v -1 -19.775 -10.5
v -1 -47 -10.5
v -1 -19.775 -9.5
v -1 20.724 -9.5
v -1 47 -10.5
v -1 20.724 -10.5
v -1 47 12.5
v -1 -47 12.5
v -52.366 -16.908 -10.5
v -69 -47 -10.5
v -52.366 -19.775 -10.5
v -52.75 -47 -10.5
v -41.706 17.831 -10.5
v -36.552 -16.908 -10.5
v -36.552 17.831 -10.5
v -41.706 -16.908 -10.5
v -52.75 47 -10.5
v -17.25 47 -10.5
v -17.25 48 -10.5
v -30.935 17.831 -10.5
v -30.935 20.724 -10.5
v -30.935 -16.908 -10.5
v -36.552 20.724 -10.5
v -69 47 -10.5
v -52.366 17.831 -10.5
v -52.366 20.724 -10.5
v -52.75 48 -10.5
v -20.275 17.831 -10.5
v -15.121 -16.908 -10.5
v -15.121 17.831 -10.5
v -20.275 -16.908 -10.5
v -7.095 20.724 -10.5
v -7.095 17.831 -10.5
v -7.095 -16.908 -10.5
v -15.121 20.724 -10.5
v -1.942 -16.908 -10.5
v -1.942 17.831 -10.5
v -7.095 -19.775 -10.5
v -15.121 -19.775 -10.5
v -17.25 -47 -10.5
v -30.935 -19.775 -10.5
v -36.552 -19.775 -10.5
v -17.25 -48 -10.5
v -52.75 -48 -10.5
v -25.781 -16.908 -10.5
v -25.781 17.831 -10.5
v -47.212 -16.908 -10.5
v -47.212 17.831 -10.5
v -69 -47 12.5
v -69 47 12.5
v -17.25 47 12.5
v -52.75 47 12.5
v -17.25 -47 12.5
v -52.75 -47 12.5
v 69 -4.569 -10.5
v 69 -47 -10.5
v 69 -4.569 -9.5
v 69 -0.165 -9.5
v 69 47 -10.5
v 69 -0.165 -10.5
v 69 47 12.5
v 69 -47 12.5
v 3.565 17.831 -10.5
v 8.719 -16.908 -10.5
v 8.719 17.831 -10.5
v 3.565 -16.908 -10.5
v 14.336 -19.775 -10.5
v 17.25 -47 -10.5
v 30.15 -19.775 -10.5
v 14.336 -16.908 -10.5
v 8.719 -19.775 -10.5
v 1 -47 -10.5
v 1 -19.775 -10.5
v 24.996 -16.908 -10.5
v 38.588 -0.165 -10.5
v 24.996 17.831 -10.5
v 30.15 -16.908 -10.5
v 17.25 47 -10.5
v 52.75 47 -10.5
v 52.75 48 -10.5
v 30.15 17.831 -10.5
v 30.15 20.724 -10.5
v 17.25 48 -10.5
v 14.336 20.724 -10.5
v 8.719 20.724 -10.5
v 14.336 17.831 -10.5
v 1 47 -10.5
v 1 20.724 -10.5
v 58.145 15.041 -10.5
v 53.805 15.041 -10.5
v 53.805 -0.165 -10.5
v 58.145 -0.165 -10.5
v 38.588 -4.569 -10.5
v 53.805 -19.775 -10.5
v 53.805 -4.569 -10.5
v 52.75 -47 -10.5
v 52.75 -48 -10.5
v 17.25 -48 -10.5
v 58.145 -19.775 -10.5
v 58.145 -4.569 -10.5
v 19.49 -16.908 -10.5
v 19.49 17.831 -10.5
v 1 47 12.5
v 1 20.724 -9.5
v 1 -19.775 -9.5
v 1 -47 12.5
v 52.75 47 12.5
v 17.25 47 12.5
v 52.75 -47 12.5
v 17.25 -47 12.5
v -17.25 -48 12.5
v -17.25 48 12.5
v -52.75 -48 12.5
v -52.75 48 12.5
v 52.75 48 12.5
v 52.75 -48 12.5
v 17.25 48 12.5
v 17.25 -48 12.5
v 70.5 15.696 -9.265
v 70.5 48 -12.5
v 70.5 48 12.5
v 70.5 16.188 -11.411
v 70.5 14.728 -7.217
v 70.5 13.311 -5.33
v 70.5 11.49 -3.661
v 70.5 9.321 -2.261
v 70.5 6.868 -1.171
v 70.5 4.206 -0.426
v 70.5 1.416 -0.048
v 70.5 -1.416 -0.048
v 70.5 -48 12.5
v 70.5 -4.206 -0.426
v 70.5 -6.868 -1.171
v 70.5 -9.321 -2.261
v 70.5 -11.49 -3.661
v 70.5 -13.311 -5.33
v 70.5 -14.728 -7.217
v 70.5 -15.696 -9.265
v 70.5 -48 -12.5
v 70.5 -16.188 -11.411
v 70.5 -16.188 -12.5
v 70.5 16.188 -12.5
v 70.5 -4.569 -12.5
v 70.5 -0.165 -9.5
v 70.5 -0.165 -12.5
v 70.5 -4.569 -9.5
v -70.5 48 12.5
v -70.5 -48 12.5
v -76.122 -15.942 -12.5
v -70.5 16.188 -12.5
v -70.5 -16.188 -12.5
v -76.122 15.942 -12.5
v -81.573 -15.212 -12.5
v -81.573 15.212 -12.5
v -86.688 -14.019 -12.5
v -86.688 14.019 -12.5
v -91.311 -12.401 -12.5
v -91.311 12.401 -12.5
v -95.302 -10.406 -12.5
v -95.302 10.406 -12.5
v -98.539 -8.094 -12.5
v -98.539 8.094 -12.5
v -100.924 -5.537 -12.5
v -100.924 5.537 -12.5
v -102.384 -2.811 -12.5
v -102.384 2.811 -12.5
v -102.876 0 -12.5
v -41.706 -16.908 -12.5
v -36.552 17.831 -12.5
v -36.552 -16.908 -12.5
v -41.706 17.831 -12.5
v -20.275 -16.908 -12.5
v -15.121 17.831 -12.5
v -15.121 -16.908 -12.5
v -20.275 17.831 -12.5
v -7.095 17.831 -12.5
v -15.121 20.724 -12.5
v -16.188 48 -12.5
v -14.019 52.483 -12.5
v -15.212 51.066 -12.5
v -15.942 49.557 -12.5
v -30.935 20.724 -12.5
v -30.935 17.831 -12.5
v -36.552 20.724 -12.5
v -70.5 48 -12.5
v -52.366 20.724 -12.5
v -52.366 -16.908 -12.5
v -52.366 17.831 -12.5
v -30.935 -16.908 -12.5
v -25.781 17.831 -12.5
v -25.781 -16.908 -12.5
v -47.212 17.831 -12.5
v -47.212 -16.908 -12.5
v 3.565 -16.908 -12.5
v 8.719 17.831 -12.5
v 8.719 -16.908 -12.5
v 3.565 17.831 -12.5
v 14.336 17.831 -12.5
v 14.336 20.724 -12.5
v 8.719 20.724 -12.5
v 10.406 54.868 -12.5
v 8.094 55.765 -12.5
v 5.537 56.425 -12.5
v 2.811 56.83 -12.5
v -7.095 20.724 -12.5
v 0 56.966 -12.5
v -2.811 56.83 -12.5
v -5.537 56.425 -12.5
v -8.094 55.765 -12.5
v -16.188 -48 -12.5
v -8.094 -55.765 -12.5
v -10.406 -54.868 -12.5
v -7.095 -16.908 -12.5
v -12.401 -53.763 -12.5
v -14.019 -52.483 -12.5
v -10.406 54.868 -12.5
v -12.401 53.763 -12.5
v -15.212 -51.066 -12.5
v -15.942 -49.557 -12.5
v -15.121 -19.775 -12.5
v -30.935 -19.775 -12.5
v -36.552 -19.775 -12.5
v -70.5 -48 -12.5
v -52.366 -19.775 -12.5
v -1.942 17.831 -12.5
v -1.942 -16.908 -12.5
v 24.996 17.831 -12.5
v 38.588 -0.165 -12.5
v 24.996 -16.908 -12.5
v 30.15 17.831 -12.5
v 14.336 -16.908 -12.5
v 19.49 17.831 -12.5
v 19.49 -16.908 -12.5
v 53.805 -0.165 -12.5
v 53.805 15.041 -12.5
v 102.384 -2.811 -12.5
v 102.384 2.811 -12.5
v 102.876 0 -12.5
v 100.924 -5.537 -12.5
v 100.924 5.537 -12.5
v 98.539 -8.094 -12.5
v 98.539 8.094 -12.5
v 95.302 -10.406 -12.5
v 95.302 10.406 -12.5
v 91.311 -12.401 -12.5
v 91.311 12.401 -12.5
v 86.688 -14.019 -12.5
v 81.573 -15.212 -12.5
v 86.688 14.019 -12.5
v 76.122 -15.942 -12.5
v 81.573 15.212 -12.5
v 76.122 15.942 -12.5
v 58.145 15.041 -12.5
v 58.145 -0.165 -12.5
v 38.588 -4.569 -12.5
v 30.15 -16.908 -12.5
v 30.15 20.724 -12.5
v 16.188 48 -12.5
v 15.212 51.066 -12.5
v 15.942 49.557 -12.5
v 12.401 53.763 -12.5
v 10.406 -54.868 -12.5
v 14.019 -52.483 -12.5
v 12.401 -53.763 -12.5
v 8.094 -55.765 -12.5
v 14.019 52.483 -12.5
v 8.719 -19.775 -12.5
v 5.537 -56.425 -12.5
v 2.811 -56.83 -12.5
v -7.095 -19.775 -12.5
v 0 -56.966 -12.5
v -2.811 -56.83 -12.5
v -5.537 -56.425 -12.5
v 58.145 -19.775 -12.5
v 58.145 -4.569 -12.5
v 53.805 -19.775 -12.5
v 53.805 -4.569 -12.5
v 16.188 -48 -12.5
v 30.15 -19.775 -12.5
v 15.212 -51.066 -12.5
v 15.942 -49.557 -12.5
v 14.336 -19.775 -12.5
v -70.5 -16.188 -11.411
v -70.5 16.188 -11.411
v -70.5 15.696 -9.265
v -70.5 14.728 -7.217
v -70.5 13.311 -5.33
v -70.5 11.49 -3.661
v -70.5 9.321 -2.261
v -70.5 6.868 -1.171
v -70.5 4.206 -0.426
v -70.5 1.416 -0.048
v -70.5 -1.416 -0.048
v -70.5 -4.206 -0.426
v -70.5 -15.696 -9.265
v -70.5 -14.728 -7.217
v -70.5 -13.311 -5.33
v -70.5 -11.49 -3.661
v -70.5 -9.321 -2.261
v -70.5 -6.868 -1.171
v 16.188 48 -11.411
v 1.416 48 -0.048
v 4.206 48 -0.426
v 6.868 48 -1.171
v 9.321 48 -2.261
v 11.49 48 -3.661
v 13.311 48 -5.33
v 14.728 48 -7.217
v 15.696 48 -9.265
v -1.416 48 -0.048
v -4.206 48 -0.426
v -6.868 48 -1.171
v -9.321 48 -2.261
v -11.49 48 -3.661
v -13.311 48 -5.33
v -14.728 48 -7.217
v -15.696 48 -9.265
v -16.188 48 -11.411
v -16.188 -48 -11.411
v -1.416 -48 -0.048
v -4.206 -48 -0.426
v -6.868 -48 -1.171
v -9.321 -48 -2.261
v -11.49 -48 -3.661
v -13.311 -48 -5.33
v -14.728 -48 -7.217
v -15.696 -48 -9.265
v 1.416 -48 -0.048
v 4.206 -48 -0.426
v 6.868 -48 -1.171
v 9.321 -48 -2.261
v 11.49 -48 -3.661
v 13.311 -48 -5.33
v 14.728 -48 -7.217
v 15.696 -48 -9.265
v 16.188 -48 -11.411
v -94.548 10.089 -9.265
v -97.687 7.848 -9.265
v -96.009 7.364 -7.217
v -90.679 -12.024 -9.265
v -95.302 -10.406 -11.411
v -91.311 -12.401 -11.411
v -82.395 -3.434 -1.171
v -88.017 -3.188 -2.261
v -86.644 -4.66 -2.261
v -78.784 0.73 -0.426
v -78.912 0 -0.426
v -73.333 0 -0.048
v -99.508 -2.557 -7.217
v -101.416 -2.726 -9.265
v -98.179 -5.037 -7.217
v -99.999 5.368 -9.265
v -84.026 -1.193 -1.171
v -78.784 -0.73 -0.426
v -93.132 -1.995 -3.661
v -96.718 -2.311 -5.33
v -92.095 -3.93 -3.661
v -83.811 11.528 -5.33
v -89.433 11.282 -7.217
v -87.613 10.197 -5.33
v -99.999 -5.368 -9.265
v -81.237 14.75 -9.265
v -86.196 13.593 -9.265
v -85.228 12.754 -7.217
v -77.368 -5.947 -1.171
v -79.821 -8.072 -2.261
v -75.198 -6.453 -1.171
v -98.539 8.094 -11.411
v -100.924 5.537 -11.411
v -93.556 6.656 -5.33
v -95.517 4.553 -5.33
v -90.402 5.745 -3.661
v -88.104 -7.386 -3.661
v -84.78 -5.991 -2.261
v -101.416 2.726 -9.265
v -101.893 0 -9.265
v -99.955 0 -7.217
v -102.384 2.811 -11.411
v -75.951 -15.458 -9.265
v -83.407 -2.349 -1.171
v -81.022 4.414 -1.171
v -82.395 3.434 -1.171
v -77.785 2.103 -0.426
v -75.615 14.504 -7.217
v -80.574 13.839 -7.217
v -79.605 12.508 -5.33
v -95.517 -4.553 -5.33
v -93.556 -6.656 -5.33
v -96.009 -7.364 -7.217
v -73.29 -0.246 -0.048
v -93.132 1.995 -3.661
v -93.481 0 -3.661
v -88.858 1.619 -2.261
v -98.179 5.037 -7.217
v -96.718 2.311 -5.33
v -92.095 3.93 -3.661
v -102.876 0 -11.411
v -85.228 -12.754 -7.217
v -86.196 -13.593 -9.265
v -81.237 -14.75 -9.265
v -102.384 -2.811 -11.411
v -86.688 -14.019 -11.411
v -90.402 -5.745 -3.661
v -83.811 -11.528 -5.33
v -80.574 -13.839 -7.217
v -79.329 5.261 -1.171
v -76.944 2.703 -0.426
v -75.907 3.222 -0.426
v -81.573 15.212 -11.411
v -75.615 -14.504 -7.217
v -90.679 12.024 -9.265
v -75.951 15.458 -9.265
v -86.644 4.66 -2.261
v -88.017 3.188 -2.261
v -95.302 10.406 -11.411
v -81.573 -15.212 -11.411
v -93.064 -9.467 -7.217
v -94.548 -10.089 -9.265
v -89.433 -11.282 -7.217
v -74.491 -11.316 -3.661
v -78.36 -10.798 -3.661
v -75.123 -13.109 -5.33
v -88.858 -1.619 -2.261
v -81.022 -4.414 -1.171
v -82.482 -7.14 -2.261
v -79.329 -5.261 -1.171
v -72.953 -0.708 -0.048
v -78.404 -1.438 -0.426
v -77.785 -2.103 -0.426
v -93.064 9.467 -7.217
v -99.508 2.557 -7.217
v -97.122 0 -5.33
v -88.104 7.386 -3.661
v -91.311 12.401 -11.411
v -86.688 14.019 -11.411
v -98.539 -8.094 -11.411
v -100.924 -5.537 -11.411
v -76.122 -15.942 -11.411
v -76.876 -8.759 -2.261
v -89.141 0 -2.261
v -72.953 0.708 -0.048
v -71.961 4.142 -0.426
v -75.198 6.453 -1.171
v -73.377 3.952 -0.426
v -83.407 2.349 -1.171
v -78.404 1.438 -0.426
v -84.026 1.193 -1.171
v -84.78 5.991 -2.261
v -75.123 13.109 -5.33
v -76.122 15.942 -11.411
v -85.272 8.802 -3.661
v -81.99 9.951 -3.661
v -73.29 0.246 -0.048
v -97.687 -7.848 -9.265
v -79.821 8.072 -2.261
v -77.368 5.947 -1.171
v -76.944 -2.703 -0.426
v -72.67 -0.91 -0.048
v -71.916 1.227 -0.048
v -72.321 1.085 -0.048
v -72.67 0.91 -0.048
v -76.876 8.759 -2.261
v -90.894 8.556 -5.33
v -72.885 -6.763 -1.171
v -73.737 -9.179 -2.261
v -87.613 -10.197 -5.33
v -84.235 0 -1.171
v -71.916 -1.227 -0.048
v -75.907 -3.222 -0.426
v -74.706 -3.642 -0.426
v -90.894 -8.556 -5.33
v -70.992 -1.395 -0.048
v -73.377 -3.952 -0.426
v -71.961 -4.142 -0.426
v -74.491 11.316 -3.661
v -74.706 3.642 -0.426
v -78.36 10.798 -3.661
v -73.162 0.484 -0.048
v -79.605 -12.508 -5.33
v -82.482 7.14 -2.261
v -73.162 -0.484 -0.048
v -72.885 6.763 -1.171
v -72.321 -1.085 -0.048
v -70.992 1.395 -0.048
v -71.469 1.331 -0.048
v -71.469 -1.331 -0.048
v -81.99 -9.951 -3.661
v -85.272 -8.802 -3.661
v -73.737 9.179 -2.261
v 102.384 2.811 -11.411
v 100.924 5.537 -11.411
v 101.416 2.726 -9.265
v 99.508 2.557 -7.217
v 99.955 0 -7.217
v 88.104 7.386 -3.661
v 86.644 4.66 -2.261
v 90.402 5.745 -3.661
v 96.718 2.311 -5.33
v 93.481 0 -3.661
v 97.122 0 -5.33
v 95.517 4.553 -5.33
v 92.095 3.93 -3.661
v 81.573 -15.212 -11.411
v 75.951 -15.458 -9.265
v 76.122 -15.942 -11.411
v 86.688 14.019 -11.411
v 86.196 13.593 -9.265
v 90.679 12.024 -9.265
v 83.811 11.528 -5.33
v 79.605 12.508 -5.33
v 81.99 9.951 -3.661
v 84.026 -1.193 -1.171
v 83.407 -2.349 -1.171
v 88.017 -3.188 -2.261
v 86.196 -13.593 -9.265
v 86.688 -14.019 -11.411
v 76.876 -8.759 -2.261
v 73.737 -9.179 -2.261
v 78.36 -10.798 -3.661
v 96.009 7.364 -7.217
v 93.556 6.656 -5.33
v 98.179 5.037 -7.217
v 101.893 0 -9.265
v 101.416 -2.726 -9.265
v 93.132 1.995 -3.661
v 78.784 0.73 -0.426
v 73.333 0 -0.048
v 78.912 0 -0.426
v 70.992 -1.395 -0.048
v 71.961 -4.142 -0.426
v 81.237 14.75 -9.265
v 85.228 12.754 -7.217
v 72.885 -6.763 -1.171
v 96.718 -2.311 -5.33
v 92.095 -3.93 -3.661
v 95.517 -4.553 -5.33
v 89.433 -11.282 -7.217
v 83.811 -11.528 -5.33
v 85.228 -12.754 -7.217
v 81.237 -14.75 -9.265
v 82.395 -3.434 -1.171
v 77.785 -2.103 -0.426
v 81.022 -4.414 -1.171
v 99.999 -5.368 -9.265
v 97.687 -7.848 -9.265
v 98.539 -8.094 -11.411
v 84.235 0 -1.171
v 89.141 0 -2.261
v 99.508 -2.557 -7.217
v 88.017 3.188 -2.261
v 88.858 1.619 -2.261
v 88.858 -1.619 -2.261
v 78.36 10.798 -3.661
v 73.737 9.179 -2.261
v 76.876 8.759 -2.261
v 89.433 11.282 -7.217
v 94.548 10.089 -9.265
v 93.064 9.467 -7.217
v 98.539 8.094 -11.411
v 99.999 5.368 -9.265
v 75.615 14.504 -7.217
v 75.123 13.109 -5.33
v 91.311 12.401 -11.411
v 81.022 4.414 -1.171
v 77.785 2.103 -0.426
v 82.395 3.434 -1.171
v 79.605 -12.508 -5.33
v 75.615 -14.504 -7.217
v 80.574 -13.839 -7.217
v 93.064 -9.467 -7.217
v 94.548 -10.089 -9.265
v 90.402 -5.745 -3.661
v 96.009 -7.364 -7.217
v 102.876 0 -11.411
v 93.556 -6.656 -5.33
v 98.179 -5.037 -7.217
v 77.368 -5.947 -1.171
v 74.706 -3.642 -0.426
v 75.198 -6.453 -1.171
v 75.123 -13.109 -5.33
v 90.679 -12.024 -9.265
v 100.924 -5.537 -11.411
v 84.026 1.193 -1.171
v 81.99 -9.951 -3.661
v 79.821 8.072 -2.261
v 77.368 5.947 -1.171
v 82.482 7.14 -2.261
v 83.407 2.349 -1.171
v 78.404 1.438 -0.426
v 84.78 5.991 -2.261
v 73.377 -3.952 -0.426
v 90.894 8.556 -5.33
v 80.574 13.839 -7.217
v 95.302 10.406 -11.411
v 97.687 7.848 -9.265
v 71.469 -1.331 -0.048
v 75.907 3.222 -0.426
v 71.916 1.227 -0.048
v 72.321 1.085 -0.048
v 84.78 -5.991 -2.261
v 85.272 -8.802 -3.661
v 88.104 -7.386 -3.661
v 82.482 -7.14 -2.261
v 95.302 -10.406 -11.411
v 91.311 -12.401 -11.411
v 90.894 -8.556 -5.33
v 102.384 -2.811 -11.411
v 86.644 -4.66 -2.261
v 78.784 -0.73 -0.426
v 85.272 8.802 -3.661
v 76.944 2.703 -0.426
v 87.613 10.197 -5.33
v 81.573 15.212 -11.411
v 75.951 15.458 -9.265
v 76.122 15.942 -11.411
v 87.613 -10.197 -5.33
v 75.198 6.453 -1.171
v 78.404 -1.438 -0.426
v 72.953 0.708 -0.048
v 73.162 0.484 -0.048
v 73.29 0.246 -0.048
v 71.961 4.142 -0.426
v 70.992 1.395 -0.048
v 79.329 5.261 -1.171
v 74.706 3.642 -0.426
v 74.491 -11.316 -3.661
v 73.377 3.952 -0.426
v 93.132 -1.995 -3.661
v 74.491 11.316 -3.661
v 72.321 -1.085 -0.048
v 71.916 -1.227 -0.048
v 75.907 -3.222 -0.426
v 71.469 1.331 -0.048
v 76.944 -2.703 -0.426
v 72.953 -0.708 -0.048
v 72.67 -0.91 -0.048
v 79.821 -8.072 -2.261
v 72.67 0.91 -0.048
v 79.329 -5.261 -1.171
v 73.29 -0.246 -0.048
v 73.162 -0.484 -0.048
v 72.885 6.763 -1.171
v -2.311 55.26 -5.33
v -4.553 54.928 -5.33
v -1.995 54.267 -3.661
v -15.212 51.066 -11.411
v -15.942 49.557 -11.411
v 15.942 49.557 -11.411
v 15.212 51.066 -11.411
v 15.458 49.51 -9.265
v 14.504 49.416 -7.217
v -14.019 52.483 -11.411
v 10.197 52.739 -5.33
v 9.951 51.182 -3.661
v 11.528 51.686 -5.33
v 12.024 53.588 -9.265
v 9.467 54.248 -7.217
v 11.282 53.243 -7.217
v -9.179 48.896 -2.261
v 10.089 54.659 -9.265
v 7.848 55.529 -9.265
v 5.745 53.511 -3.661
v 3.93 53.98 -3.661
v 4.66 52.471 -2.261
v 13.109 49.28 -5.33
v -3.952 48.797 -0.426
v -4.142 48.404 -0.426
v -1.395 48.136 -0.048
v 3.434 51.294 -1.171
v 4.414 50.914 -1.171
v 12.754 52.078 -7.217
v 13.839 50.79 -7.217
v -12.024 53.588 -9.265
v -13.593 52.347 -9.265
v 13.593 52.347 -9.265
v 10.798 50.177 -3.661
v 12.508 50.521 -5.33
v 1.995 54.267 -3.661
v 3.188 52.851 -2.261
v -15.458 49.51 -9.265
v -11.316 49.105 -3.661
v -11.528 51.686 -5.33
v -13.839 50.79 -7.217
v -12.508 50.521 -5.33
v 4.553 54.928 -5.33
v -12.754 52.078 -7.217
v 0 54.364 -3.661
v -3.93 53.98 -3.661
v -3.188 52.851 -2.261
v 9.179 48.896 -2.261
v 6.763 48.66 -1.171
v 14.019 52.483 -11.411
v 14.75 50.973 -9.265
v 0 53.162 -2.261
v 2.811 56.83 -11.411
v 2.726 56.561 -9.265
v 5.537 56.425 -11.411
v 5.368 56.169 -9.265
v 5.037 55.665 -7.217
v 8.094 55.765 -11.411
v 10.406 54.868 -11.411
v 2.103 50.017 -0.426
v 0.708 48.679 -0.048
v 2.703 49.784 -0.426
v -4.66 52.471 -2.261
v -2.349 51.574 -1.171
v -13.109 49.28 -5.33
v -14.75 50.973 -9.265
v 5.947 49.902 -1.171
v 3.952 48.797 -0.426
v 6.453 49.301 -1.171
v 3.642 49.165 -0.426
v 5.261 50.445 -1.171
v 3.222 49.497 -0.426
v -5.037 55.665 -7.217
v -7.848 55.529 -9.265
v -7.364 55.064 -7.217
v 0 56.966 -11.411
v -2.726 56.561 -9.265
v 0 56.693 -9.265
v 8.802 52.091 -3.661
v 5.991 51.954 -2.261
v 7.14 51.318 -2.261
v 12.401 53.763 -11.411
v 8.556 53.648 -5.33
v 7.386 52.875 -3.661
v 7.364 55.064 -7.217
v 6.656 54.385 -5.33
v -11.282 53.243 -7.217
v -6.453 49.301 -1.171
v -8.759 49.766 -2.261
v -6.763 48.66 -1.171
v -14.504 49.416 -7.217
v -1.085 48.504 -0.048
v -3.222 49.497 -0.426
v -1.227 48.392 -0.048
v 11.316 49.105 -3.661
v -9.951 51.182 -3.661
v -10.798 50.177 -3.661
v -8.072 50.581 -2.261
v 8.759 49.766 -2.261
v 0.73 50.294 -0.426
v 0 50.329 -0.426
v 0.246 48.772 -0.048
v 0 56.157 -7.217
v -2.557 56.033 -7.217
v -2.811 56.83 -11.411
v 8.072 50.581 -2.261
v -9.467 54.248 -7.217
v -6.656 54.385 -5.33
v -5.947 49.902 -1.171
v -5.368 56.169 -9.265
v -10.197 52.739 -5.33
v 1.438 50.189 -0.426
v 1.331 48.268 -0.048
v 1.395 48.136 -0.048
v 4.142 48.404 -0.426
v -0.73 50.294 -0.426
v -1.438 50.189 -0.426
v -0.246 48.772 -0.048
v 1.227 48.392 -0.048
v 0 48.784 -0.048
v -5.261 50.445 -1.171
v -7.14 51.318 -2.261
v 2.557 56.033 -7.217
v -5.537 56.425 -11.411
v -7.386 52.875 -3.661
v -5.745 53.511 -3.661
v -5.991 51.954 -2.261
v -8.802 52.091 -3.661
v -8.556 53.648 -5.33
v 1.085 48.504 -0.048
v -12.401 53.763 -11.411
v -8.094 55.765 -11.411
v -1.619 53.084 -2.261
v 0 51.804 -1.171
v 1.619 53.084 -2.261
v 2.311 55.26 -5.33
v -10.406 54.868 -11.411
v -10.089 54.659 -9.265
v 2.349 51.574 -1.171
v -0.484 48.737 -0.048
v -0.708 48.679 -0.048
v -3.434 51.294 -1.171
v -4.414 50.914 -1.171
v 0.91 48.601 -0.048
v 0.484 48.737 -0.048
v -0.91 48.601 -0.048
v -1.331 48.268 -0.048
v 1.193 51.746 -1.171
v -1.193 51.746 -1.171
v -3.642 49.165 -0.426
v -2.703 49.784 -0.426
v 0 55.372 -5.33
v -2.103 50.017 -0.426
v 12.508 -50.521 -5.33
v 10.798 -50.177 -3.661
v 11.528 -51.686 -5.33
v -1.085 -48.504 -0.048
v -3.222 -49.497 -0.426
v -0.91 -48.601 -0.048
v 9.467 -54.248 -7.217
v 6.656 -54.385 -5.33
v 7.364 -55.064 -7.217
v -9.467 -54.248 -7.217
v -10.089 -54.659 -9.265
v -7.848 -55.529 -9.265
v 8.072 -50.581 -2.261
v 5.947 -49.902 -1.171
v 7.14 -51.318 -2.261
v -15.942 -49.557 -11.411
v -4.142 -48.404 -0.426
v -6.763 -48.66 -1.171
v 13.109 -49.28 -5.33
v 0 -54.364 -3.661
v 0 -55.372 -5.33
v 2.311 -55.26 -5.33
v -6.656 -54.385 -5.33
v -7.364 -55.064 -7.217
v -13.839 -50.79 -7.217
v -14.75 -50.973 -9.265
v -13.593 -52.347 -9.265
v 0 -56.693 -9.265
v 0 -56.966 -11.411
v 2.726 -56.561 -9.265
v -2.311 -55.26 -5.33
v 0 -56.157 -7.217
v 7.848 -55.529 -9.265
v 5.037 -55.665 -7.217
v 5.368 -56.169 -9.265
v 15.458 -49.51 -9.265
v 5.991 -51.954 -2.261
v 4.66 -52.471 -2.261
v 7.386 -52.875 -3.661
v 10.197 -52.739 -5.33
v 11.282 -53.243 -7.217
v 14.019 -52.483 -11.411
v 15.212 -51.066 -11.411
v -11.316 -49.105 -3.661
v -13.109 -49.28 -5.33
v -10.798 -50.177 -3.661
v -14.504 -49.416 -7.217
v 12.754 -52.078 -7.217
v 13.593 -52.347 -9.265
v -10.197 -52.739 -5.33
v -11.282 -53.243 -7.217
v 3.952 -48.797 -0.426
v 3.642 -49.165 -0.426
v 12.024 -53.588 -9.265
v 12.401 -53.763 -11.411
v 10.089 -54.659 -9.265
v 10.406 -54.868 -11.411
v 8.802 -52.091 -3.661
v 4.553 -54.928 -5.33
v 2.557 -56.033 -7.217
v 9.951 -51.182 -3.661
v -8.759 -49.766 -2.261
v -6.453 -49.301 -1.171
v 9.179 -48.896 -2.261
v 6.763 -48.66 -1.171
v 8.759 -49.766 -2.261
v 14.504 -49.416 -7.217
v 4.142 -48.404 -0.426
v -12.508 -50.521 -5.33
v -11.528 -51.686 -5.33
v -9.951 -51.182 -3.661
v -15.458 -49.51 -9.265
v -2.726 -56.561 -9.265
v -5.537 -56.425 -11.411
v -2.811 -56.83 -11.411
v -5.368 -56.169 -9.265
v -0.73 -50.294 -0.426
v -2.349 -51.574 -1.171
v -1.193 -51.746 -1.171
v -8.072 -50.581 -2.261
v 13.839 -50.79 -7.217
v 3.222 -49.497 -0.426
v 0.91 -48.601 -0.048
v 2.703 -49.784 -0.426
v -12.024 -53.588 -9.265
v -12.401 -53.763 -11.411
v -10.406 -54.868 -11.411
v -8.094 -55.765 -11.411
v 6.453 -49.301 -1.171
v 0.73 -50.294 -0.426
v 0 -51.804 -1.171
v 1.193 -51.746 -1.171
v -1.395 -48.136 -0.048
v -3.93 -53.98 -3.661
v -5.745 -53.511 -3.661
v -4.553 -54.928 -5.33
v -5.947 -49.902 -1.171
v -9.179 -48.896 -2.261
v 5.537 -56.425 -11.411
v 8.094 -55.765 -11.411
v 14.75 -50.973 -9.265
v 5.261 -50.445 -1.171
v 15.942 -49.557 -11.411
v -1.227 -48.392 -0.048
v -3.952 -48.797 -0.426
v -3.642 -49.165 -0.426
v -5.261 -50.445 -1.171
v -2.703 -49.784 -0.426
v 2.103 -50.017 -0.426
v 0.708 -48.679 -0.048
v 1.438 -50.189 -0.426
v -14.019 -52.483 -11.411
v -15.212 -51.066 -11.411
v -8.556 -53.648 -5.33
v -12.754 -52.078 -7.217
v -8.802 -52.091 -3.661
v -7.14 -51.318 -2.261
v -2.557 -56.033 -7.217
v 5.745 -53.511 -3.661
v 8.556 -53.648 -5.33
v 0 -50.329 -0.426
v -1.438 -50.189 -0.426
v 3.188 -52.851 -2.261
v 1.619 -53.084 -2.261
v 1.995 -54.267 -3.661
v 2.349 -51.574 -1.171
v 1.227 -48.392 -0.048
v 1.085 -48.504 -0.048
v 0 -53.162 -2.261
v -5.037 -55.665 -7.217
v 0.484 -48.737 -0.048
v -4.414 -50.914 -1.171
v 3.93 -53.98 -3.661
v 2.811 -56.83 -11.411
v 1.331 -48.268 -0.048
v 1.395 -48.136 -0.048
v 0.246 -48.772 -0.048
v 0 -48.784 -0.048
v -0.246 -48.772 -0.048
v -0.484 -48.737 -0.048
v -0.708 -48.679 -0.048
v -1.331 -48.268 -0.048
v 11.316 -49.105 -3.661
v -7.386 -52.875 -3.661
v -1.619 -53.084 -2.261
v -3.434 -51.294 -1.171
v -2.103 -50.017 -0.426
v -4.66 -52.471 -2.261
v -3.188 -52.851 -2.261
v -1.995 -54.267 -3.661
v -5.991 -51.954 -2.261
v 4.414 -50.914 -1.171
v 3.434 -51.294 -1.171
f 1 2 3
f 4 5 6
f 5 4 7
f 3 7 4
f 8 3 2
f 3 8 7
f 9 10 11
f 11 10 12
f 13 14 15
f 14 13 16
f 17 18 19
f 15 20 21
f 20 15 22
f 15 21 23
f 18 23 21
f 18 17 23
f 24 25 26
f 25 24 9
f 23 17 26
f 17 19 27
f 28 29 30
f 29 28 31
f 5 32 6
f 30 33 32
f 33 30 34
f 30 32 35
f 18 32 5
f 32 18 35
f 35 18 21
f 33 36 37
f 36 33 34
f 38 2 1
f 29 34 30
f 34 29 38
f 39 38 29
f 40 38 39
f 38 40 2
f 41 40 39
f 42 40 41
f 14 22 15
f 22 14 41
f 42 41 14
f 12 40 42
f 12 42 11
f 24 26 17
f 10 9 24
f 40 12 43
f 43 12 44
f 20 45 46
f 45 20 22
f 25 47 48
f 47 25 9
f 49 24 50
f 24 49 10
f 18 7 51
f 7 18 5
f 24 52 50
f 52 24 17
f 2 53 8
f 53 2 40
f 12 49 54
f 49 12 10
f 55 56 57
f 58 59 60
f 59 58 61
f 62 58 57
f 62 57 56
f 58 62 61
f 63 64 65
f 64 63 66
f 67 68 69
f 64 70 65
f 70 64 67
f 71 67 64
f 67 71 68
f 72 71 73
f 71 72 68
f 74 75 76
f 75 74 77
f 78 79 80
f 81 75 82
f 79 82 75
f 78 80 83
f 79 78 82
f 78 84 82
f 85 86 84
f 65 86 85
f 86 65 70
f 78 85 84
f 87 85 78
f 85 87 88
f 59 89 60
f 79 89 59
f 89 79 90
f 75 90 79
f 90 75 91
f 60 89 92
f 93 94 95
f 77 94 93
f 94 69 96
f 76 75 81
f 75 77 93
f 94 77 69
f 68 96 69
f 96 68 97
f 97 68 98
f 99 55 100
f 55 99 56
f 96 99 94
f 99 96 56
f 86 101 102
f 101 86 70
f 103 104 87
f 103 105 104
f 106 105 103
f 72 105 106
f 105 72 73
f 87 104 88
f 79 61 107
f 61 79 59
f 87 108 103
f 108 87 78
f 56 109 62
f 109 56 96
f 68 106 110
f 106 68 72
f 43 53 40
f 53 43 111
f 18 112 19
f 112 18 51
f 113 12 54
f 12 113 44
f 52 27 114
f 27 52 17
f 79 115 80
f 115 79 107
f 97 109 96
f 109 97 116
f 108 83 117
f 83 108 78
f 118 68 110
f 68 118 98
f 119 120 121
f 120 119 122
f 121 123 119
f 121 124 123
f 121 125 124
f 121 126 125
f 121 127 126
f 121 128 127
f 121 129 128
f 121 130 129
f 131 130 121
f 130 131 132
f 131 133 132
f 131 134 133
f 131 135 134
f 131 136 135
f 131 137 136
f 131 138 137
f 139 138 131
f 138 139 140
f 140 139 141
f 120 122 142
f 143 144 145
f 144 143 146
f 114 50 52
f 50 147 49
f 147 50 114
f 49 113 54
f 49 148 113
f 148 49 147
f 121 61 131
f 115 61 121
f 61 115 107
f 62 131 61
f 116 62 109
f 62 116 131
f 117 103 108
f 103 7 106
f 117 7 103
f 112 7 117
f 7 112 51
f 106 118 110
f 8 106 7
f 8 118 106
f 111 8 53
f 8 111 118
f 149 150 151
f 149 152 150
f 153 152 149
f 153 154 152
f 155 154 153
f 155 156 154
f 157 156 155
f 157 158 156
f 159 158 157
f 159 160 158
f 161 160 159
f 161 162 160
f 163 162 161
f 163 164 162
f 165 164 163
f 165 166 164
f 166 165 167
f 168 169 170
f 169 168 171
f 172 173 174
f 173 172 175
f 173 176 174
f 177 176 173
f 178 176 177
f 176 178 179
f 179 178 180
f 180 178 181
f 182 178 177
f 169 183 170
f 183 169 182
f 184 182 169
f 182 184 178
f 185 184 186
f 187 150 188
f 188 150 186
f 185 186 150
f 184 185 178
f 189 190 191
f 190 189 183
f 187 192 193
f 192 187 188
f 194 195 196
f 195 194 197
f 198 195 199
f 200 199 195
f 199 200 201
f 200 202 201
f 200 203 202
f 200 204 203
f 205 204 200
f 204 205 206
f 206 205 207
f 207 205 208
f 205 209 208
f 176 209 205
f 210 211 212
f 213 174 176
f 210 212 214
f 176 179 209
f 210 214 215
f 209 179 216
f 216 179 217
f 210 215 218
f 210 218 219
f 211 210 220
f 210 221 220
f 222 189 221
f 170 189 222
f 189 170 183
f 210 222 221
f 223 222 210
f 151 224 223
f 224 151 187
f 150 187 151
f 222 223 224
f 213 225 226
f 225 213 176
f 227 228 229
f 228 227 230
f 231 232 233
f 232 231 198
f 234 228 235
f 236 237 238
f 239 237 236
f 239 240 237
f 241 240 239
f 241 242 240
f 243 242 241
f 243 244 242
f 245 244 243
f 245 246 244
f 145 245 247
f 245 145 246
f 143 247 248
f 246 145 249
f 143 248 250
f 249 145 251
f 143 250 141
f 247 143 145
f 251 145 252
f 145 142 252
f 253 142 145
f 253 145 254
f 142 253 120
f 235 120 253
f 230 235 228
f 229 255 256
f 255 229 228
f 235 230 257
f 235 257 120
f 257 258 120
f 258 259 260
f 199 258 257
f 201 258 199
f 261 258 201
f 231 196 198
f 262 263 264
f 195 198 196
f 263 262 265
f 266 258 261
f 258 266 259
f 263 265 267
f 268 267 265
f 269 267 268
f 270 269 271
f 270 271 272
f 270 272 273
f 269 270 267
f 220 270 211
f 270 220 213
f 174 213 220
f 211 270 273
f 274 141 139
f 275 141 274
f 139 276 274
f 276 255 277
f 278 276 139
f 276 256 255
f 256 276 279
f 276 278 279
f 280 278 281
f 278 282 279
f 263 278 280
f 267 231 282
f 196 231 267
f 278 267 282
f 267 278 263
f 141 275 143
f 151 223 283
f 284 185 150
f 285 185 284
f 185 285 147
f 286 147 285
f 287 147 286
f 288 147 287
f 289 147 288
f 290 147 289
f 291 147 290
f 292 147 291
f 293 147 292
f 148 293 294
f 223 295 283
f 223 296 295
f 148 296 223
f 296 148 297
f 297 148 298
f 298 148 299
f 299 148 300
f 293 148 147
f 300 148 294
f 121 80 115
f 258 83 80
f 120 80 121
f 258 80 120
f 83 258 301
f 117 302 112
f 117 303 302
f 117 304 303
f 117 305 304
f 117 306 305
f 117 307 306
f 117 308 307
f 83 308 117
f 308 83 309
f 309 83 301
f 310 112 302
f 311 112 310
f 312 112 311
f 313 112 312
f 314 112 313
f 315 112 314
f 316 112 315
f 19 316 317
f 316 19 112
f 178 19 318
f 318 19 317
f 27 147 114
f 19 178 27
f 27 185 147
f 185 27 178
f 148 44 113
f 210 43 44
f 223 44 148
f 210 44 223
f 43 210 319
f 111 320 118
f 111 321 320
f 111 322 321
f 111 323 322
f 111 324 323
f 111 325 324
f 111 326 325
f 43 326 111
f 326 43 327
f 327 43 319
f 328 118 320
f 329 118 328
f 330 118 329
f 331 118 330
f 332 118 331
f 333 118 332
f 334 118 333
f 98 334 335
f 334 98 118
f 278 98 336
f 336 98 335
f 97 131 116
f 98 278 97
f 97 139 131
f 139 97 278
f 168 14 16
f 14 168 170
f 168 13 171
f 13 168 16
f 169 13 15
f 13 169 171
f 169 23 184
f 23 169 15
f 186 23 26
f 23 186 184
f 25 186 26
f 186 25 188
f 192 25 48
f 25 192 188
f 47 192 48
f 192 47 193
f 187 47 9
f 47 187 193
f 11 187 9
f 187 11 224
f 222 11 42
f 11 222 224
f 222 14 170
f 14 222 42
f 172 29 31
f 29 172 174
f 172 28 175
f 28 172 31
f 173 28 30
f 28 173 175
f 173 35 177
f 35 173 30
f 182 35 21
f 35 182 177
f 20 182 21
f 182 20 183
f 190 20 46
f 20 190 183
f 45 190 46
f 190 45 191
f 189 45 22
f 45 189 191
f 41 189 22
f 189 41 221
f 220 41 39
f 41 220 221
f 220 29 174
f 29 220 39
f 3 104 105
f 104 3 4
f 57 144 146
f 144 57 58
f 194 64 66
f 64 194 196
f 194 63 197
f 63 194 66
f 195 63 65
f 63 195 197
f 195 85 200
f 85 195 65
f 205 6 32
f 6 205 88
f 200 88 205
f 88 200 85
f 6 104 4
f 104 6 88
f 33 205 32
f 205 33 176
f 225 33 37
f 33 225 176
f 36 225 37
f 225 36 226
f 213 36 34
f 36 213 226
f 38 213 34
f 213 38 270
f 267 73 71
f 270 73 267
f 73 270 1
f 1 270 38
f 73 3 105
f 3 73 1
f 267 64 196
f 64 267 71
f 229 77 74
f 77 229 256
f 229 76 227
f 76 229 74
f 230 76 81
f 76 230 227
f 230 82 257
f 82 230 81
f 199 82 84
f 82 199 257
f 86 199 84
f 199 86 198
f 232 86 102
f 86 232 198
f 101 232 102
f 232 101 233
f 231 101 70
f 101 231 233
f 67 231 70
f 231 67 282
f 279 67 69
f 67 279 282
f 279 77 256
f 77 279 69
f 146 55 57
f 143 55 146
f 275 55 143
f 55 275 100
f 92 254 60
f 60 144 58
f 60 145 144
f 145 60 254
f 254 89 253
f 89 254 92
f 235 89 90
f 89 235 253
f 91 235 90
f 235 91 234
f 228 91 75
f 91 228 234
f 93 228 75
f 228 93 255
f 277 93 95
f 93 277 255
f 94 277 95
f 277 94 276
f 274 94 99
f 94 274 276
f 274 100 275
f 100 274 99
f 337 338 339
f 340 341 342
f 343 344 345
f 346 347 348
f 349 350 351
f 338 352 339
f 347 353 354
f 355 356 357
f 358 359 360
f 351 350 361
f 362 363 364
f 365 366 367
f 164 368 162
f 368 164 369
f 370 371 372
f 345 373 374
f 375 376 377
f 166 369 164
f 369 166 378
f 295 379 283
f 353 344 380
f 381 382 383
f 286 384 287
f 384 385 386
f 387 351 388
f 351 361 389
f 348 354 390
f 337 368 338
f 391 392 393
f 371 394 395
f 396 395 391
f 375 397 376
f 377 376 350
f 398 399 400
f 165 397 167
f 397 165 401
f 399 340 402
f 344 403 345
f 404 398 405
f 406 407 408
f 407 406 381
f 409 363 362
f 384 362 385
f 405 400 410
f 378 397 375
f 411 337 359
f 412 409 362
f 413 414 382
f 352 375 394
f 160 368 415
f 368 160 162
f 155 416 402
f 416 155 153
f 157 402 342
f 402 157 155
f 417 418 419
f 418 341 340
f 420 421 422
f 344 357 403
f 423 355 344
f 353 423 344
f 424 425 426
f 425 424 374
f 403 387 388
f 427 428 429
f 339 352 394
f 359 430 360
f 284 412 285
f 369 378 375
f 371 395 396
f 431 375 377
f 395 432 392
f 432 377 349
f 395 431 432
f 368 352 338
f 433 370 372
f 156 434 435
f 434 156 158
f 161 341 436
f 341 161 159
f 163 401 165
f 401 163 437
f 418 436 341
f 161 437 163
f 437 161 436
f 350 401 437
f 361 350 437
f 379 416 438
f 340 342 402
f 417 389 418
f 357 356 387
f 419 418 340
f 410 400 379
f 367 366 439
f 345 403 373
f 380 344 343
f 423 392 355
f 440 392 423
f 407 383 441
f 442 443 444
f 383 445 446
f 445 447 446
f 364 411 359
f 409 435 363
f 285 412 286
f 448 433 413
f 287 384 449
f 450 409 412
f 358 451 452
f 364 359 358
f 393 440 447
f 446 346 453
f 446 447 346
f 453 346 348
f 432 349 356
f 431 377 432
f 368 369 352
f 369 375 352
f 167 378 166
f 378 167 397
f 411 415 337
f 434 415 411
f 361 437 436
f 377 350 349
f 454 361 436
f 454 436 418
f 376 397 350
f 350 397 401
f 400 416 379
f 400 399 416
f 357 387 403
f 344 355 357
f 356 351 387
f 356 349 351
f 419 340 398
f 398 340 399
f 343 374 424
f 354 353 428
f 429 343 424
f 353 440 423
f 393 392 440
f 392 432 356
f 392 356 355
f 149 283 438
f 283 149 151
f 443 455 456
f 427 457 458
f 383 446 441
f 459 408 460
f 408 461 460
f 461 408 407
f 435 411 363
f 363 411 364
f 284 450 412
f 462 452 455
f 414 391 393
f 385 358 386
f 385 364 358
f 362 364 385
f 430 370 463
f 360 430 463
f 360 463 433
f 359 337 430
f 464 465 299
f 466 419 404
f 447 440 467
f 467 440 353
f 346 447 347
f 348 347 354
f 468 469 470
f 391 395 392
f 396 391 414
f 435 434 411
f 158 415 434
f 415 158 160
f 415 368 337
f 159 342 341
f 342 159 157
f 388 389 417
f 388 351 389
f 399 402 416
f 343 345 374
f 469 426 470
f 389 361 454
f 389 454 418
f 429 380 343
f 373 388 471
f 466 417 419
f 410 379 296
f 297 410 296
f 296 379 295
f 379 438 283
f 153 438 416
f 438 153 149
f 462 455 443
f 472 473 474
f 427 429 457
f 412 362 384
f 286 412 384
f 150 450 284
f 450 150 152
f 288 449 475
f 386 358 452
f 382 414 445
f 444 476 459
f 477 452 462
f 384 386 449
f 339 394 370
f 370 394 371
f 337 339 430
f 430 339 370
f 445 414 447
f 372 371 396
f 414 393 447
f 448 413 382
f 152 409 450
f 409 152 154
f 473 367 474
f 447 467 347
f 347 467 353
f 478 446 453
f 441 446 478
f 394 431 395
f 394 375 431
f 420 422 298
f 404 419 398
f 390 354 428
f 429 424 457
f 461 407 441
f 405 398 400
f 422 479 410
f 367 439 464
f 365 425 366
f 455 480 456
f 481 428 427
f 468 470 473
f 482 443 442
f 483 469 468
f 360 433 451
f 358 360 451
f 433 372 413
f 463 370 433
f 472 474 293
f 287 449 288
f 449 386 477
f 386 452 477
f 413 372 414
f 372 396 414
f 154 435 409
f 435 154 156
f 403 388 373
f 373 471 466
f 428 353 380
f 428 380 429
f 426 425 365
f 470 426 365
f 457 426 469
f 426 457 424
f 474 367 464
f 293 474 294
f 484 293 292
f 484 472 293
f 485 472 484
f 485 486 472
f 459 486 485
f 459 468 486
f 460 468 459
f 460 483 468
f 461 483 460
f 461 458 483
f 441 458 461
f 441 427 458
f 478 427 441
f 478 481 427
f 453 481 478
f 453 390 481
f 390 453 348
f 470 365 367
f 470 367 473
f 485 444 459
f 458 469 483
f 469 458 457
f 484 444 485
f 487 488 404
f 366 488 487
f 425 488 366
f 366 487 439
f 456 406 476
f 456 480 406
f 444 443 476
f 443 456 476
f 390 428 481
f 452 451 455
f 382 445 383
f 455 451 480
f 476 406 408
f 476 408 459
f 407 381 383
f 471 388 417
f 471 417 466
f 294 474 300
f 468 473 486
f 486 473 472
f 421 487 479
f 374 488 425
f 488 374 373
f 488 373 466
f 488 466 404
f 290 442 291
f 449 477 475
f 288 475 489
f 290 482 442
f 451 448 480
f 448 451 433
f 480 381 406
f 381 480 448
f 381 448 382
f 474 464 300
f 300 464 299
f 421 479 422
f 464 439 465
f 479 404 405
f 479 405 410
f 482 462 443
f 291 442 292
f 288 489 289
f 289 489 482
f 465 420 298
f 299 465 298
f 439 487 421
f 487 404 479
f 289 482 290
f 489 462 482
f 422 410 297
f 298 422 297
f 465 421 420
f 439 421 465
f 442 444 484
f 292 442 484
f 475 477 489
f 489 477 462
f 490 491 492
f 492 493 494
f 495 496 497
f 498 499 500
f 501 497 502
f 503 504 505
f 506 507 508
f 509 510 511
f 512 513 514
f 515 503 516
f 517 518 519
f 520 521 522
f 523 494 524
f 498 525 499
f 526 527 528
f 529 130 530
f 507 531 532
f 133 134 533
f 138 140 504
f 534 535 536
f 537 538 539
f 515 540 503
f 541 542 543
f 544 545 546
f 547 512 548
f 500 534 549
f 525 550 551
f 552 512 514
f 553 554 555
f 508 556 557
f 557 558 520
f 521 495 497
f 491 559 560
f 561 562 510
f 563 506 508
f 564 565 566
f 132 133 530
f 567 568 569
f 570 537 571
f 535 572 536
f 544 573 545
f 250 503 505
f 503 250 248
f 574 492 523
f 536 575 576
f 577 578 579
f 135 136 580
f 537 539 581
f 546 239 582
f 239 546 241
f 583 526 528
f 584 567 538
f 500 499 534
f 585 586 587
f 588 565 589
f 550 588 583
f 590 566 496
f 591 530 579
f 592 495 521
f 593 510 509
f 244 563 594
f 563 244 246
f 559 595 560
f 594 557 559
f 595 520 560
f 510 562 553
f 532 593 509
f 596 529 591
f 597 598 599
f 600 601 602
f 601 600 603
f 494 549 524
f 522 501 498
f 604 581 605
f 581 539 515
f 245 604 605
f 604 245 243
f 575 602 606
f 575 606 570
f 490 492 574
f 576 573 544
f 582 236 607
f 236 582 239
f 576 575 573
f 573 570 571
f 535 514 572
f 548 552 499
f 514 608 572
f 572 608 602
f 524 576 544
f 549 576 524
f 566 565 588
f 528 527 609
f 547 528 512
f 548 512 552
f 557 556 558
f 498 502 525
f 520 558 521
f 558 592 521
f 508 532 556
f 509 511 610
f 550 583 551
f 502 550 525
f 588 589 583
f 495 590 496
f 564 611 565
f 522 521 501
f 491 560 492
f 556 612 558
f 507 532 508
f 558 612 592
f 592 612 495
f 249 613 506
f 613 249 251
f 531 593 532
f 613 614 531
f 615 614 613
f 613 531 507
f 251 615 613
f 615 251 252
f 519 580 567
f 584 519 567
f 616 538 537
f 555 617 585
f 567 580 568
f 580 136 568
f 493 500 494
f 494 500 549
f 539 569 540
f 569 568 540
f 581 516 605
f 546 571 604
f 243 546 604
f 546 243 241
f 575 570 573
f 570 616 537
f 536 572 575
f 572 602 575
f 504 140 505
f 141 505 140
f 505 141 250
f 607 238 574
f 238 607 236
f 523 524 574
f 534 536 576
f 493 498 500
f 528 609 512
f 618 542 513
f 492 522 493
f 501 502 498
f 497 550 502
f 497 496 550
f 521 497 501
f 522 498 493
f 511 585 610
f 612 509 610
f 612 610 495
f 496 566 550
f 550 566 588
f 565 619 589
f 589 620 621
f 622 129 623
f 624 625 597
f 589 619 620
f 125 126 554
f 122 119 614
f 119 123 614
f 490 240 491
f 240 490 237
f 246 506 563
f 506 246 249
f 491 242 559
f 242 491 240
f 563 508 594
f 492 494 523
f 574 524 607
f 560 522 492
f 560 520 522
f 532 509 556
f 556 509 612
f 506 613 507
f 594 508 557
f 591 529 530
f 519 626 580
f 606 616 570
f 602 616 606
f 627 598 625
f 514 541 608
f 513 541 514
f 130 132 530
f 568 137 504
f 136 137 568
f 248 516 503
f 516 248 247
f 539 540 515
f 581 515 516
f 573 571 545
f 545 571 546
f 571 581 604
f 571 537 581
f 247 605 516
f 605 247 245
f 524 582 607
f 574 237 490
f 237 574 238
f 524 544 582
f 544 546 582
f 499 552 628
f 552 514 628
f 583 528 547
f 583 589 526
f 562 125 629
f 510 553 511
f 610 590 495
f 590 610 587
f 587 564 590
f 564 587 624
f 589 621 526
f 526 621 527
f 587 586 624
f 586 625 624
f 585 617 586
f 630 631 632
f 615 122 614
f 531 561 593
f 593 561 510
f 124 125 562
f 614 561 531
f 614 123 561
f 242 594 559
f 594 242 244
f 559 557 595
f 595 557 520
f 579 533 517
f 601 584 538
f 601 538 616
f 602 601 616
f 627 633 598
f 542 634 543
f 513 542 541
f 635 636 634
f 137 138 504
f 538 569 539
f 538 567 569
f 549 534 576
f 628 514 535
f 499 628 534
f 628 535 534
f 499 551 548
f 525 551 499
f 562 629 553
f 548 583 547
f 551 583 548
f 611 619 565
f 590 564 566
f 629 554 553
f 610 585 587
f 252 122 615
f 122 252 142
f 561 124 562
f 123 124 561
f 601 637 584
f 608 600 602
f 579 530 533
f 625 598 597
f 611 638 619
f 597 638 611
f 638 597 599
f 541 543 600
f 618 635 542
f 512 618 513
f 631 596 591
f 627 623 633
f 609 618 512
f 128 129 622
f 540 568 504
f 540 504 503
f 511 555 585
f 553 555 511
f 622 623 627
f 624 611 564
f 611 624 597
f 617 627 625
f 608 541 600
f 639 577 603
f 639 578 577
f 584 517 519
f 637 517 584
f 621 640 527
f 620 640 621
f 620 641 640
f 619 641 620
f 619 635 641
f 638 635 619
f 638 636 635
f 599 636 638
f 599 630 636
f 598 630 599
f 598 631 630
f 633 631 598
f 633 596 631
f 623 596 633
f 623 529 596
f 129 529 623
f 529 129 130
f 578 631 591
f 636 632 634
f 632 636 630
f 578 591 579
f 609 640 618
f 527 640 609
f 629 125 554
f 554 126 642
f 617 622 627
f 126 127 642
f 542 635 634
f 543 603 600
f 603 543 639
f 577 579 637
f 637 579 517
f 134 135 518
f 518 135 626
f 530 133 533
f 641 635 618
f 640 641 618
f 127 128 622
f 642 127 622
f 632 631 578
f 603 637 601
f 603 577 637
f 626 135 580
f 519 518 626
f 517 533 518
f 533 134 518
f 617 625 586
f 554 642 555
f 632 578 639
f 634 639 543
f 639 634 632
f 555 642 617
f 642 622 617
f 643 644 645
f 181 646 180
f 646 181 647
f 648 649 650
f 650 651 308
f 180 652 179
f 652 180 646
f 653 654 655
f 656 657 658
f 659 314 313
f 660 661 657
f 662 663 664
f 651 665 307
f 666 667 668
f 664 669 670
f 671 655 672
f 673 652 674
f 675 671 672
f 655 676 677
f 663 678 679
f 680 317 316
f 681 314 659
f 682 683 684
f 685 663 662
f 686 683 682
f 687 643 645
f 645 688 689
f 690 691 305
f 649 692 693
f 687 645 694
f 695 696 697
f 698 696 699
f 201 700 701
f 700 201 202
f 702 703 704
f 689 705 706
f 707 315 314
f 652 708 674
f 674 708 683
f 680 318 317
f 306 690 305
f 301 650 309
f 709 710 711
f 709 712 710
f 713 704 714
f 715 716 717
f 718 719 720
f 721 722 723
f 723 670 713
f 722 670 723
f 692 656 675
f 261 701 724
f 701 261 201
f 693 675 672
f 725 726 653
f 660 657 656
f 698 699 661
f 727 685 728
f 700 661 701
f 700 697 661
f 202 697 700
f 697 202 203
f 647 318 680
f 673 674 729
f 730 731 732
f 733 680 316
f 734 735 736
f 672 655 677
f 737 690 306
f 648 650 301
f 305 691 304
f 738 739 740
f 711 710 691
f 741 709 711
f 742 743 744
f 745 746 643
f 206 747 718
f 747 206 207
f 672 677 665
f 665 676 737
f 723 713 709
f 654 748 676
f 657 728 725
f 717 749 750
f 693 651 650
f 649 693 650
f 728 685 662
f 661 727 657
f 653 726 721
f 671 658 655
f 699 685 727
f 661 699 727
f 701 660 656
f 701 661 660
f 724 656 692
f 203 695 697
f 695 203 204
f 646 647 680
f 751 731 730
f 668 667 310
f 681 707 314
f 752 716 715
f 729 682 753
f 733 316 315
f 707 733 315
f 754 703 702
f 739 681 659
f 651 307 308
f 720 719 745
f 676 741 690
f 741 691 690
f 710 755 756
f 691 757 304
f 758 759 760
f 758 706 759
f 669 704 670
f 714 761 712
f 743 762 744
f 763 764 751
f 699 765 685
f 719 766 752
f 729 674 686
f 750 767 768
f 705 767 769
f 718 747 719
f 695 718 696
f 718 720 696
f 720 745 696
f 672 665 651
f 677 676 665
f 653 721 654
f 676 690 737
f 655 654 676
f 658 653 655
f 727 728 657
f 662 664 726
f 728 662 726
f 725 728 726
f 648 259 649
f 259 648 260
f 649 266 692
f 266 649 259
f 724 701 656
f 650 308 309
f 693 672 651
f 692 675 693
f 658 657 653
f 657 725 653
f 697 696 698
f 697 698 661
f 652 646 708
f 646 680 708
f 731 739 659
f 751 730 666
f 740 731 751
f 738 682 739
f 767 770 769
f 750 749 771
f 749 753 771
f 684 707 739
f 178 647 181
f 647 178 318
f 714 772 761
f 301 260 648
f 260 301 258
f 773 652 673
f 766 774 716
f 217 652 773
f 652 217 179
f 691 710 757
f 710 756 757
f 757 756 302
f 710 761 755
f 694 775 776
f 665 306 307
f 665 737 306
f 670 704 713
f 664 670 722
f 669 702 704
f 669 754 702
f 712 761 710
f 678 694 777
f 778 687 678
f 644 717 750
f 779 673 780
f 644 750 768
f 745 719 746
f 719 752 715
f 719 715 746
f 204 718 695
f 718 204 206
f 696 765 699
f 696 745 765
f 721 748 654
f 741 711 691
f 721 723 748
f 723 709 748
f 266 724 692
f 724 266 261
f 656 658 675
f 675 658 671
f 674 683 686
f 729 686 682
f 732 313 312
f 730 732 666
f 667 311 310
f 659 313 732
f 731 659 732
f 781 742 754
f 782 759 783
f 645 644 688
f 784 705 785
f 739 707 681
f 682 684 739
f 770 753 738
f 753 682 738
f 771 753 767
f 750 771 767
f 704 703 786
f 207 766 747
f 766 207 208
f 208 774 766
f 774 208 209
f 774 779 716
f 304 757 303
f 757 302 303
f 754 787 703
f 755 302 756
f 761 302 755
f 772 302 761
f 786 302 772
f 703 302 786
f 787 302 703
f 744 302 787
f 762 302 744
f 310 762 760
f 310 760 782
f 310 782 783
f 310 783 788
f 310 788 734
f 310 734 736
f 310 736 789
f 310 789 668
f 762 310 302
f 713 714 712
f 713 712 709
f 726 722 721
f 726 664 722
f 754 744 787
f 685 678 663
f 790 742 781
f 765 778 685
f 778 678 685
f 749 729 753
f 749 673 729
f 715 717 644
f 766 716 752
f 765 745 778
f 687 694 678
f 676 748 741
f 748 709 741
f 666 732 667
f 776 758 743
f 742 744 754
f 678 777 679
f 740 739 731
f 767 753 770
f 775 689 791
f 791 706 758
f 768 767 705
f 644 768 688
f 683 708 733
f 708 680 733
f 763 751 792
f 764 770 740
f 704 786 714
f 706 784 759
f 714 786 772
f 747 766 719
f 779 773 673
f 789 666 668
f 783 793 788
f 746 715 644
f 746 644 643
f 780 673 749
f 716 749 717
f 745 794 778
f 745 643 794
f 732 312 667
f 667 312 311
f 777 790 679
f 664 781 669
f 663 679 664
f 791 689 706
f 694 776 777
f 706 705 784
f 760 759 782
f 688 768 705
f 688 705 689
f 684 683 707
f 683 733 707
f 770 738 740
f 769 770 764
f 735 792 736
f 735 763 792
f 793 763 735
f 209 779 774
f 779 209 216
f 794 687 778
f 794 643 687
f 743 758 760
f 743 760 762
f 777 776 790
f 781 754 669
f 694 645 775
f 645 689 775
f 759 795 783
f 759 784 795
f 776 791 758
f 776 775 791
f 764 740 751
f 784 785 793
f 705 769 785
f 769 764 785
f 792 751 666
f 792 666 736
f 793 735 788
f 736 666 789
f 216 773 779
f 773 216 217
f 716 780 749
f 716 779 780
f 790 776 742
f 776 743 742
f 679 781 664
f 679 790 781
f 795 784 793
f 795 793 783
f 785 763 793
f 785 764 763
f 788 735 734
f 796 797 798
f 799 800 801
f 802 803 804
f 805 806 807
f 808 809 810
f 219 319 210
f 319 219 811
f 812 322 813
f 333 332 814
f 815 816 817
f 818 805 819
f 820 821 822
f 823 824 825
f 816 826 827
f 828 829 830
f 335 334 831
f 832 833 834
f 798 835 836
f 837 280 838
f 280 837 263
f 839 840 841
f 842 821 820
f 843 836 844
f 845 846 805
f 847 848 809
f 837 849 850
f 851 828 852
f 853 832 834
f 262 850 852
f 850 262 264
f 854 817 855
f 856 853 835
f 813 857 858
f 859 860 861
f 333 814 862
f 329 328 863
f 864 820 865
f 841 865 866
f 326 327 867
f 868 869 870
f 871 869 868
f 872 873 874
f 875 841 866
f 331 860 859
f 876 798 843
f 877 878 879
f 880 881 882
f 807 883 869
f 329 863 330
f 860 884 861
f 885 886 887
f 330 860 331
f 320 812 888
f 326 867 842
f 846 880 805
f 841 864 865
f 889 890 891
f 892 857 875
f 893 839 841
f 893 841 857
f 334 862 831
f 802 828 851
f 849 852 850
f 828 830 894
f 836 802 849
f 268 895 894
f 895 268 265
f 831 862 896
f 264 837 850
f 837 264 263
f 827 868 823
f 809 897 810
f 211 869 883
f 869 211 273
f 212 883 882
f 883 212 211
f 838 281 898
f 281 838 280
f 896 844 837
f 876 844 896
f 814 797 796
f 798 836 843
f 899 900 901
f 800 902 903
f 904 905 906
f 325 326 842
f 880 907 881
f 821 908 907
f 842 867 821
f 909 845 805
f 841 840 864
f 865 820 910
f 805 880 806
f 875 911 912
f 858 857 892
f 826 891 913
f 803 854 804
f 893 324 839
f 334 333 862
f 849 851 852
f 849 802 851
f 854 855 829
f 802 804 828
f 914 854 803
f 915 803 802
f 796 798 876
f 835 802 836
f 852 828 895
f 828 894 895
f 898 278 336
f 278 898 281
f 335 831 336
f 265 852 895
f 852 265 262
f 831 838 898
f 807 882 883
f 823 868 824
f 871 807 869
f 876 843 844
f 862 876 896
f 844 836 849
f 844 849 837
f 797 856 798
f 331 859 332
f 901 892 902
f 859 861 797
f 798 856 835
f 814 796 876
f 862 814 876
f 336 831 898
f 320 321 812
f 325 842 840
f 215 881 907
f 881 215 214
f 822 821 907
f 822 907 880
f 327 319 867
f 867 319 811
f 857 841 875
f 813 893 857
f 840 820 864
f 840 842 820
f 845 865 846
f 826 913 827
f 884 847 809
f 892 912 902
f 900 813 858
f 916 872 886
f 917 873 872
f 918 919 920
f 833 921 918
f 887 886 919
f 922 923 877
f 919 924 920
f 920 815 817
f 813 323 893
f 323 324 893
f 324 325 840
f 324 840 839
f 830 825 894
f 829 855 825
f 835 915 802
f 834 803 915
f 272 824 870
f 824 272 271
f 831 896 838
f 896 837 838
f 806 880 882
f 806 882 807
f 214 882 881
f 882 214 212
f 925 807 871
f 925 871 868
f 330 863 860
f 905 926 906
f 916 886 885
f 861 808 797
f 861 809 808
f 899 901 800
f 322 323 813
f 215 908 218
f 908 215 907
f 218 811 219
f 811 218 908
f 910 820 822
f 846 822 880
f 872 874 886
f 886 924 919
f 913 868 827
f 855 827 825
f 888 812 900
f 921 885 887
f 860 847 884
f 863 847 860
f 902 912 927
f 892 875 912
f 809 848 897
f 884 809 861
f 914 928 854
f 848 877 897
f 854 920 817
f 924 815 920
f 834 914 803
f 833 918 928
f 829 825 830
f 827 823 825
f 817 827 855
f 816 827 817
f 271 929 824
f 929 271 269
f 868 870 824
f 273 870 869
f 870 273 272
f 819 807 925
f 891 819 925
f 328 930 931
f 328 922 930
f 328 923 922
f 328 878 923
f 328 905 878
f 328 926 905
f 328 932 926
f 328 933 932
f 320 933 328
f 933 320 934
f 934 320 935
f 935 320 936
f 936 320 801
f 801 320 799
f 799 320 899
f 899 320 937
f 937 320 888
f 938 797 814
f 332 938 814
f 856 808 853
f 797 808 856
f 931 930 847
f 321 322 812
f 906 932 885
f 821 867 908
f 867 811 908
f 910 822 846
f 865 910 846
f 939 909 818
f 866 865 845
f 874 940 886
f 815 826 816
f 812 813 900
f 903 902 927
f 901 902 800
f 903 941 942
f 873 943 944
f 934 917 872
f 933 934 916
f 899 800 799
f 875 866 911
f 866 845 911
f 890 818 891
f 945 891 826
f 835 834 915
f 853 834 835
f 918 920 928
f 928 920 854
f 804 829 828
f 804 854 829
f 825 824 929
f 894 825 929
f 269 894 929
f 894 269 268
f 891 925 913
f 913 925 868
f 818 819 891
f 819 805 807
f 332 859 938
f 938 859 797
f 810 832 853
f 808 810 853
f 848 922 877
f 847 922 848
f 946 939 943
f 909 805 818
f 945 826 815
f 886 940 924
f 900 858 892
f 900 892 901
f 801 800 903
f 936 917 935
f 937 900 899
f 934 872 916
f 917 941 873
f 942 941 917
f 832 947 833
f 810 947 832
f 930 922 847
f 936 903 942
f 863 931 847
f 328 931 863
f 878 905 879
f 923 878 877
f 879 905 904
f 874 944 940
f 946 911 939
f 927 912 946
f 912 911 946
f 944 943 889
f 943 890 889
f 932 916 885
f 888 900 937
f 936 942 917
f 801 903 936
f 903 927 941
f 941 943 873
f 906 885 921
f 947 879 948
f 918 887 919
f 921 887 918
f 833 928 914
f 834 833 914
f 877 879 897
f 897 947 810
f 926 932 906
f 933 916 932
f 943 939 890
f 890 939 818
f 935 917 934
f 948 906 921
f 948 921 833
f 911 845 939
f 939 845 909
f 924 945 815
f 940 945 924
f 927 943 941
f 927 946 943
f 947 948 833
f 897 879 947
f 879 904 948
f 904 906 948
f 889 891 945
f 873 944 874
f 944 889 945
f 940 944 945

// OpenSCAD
// Functions and stuff
module elrdcyl(
   w, // width of cylinder
   d, // depth of cylinder
   h1,// straight height of cylinder
   h2 // height of rounded top
   ) {
   intersection(){
     union(){
       scale([w/2,d/2,1])cylinder(r=1,h=h1,$fn=36);  // cylinder
       translate([0,0,h1])scale([w/2,d/2,h2])sphere(r=1,$fn=36);  // top
     }
     scale([w/2,d/2,1])cylinder(r=1,h=h1+h2,$fn=36); // only needed if h2>h1
   }
}

bottom_height = 2;
wall_thickness = 2;
// This is the width WITH sleeves
// It is in agreement with the /Retail-Sleeved-Cards.scad
width = 67 + 2*wall_thickness;
height = 25;
length = 92 + 2*wall_thickness;

width_outer_box = 2 * width - wall_thickness/2;
width_inner_box = width-1.5*wall_thickness;
width_space_box = 0.5 * width;

font_size = 40;

max_width = 206;
max_height = 114;
residual_width = max_width - width_outer_box;
residual_height = max_height - length;

difference(){
   cube([width_outer_box, length, height],center=true);
    // These are two cubes that allow for the space of the two card slots
    union(){
            translate(v=[-(width_inner_box)/2-wall_thickness/2, 0, bottom_height])
                cube([width_inner_box, length-wall_thickness, height],center=true);
            translate(v=[width_inner_box/2+wall_thickness/2, 0, bottom_height])
                cube([width_inner_box, length-wall_thickness, height],center=true);
        }
    // Here are two cubes that allow for an easy grab of the cards
        union(){
            translate(v=[-(width_inner_box)/2-wall_thickness/2, 0, bottom_height])
                cube([width_space_box, 2*length, height],center=true);
            translate(v=[width_inner_box/2+wall_thickness/2, 0, bottom_height])
                cube([width_space_box, 2*length, height],center=true);
        }
    // Here is a text example that I want to use to cutout player signs...
    translate([-width_inner_box/2, 0, -height/2-bottom_height/2]) {
        linear_extrude(height=2*bottom_height){
            text("II", size=font_size, font = "Cambria", halign="center", valign="center");
        }
    }
    translate([width_inner_box/2, 0, -height/2-bottom_height/2]) {
            linear_extrude(height=2*bottom_height){
                text("II+", size=font_size, font = "Cambria", halign="center", valign="center");

            }
        }
}


//Now create the support on the sides..
delta_top_bottom = residual_height/2;
delta_side = residual_width/2;

// Making a rounding thing....
//Left side
translate([-width_outer_box/2, 0, -height/2]) {
    difference() {
        elrdcyl(2 * delta_side, delta_side, 0, height / 2);
        translate([0, - delta_side, - height / 2]) {
            cube([delta_side, 2 * delta_side, 2 * height], center = false);
        }
    }
}
// RIght side
translate([width_outer_box/2, 0, -height/2]) {
    difference() {
        elrdcyl(2 * delta_side, delta_side, 0, height / 2);
        translate([-delta_side, -delta_side, -height / 2]) {
            cube([delta_side, 2*delta_side, 2 * height], center = false);
        }
    }
}
// Top side
translate([0, length/2, -height/2]) {
    difference() {
        elrdcyl(delta_side, 2 * delta_top_bottom, 0, height / 2);
        translate([-delta_side, -delta_side, -height / 2]) {
            cube([2 * delta_side, delta_side, 2 * height], center = false);
        }
    }
}
// Bottom side
translate([0, -length/2, -height/2]) {
    difference() {
        elrdcyl(delta_side, 2 * delta_top_bottom, 0, height / 2);
        translate([-delta_side, 0, -height / 2]) {
            cube([2 * delta_side, delta_side, 2 * height], center = false);
        }
    }
}
